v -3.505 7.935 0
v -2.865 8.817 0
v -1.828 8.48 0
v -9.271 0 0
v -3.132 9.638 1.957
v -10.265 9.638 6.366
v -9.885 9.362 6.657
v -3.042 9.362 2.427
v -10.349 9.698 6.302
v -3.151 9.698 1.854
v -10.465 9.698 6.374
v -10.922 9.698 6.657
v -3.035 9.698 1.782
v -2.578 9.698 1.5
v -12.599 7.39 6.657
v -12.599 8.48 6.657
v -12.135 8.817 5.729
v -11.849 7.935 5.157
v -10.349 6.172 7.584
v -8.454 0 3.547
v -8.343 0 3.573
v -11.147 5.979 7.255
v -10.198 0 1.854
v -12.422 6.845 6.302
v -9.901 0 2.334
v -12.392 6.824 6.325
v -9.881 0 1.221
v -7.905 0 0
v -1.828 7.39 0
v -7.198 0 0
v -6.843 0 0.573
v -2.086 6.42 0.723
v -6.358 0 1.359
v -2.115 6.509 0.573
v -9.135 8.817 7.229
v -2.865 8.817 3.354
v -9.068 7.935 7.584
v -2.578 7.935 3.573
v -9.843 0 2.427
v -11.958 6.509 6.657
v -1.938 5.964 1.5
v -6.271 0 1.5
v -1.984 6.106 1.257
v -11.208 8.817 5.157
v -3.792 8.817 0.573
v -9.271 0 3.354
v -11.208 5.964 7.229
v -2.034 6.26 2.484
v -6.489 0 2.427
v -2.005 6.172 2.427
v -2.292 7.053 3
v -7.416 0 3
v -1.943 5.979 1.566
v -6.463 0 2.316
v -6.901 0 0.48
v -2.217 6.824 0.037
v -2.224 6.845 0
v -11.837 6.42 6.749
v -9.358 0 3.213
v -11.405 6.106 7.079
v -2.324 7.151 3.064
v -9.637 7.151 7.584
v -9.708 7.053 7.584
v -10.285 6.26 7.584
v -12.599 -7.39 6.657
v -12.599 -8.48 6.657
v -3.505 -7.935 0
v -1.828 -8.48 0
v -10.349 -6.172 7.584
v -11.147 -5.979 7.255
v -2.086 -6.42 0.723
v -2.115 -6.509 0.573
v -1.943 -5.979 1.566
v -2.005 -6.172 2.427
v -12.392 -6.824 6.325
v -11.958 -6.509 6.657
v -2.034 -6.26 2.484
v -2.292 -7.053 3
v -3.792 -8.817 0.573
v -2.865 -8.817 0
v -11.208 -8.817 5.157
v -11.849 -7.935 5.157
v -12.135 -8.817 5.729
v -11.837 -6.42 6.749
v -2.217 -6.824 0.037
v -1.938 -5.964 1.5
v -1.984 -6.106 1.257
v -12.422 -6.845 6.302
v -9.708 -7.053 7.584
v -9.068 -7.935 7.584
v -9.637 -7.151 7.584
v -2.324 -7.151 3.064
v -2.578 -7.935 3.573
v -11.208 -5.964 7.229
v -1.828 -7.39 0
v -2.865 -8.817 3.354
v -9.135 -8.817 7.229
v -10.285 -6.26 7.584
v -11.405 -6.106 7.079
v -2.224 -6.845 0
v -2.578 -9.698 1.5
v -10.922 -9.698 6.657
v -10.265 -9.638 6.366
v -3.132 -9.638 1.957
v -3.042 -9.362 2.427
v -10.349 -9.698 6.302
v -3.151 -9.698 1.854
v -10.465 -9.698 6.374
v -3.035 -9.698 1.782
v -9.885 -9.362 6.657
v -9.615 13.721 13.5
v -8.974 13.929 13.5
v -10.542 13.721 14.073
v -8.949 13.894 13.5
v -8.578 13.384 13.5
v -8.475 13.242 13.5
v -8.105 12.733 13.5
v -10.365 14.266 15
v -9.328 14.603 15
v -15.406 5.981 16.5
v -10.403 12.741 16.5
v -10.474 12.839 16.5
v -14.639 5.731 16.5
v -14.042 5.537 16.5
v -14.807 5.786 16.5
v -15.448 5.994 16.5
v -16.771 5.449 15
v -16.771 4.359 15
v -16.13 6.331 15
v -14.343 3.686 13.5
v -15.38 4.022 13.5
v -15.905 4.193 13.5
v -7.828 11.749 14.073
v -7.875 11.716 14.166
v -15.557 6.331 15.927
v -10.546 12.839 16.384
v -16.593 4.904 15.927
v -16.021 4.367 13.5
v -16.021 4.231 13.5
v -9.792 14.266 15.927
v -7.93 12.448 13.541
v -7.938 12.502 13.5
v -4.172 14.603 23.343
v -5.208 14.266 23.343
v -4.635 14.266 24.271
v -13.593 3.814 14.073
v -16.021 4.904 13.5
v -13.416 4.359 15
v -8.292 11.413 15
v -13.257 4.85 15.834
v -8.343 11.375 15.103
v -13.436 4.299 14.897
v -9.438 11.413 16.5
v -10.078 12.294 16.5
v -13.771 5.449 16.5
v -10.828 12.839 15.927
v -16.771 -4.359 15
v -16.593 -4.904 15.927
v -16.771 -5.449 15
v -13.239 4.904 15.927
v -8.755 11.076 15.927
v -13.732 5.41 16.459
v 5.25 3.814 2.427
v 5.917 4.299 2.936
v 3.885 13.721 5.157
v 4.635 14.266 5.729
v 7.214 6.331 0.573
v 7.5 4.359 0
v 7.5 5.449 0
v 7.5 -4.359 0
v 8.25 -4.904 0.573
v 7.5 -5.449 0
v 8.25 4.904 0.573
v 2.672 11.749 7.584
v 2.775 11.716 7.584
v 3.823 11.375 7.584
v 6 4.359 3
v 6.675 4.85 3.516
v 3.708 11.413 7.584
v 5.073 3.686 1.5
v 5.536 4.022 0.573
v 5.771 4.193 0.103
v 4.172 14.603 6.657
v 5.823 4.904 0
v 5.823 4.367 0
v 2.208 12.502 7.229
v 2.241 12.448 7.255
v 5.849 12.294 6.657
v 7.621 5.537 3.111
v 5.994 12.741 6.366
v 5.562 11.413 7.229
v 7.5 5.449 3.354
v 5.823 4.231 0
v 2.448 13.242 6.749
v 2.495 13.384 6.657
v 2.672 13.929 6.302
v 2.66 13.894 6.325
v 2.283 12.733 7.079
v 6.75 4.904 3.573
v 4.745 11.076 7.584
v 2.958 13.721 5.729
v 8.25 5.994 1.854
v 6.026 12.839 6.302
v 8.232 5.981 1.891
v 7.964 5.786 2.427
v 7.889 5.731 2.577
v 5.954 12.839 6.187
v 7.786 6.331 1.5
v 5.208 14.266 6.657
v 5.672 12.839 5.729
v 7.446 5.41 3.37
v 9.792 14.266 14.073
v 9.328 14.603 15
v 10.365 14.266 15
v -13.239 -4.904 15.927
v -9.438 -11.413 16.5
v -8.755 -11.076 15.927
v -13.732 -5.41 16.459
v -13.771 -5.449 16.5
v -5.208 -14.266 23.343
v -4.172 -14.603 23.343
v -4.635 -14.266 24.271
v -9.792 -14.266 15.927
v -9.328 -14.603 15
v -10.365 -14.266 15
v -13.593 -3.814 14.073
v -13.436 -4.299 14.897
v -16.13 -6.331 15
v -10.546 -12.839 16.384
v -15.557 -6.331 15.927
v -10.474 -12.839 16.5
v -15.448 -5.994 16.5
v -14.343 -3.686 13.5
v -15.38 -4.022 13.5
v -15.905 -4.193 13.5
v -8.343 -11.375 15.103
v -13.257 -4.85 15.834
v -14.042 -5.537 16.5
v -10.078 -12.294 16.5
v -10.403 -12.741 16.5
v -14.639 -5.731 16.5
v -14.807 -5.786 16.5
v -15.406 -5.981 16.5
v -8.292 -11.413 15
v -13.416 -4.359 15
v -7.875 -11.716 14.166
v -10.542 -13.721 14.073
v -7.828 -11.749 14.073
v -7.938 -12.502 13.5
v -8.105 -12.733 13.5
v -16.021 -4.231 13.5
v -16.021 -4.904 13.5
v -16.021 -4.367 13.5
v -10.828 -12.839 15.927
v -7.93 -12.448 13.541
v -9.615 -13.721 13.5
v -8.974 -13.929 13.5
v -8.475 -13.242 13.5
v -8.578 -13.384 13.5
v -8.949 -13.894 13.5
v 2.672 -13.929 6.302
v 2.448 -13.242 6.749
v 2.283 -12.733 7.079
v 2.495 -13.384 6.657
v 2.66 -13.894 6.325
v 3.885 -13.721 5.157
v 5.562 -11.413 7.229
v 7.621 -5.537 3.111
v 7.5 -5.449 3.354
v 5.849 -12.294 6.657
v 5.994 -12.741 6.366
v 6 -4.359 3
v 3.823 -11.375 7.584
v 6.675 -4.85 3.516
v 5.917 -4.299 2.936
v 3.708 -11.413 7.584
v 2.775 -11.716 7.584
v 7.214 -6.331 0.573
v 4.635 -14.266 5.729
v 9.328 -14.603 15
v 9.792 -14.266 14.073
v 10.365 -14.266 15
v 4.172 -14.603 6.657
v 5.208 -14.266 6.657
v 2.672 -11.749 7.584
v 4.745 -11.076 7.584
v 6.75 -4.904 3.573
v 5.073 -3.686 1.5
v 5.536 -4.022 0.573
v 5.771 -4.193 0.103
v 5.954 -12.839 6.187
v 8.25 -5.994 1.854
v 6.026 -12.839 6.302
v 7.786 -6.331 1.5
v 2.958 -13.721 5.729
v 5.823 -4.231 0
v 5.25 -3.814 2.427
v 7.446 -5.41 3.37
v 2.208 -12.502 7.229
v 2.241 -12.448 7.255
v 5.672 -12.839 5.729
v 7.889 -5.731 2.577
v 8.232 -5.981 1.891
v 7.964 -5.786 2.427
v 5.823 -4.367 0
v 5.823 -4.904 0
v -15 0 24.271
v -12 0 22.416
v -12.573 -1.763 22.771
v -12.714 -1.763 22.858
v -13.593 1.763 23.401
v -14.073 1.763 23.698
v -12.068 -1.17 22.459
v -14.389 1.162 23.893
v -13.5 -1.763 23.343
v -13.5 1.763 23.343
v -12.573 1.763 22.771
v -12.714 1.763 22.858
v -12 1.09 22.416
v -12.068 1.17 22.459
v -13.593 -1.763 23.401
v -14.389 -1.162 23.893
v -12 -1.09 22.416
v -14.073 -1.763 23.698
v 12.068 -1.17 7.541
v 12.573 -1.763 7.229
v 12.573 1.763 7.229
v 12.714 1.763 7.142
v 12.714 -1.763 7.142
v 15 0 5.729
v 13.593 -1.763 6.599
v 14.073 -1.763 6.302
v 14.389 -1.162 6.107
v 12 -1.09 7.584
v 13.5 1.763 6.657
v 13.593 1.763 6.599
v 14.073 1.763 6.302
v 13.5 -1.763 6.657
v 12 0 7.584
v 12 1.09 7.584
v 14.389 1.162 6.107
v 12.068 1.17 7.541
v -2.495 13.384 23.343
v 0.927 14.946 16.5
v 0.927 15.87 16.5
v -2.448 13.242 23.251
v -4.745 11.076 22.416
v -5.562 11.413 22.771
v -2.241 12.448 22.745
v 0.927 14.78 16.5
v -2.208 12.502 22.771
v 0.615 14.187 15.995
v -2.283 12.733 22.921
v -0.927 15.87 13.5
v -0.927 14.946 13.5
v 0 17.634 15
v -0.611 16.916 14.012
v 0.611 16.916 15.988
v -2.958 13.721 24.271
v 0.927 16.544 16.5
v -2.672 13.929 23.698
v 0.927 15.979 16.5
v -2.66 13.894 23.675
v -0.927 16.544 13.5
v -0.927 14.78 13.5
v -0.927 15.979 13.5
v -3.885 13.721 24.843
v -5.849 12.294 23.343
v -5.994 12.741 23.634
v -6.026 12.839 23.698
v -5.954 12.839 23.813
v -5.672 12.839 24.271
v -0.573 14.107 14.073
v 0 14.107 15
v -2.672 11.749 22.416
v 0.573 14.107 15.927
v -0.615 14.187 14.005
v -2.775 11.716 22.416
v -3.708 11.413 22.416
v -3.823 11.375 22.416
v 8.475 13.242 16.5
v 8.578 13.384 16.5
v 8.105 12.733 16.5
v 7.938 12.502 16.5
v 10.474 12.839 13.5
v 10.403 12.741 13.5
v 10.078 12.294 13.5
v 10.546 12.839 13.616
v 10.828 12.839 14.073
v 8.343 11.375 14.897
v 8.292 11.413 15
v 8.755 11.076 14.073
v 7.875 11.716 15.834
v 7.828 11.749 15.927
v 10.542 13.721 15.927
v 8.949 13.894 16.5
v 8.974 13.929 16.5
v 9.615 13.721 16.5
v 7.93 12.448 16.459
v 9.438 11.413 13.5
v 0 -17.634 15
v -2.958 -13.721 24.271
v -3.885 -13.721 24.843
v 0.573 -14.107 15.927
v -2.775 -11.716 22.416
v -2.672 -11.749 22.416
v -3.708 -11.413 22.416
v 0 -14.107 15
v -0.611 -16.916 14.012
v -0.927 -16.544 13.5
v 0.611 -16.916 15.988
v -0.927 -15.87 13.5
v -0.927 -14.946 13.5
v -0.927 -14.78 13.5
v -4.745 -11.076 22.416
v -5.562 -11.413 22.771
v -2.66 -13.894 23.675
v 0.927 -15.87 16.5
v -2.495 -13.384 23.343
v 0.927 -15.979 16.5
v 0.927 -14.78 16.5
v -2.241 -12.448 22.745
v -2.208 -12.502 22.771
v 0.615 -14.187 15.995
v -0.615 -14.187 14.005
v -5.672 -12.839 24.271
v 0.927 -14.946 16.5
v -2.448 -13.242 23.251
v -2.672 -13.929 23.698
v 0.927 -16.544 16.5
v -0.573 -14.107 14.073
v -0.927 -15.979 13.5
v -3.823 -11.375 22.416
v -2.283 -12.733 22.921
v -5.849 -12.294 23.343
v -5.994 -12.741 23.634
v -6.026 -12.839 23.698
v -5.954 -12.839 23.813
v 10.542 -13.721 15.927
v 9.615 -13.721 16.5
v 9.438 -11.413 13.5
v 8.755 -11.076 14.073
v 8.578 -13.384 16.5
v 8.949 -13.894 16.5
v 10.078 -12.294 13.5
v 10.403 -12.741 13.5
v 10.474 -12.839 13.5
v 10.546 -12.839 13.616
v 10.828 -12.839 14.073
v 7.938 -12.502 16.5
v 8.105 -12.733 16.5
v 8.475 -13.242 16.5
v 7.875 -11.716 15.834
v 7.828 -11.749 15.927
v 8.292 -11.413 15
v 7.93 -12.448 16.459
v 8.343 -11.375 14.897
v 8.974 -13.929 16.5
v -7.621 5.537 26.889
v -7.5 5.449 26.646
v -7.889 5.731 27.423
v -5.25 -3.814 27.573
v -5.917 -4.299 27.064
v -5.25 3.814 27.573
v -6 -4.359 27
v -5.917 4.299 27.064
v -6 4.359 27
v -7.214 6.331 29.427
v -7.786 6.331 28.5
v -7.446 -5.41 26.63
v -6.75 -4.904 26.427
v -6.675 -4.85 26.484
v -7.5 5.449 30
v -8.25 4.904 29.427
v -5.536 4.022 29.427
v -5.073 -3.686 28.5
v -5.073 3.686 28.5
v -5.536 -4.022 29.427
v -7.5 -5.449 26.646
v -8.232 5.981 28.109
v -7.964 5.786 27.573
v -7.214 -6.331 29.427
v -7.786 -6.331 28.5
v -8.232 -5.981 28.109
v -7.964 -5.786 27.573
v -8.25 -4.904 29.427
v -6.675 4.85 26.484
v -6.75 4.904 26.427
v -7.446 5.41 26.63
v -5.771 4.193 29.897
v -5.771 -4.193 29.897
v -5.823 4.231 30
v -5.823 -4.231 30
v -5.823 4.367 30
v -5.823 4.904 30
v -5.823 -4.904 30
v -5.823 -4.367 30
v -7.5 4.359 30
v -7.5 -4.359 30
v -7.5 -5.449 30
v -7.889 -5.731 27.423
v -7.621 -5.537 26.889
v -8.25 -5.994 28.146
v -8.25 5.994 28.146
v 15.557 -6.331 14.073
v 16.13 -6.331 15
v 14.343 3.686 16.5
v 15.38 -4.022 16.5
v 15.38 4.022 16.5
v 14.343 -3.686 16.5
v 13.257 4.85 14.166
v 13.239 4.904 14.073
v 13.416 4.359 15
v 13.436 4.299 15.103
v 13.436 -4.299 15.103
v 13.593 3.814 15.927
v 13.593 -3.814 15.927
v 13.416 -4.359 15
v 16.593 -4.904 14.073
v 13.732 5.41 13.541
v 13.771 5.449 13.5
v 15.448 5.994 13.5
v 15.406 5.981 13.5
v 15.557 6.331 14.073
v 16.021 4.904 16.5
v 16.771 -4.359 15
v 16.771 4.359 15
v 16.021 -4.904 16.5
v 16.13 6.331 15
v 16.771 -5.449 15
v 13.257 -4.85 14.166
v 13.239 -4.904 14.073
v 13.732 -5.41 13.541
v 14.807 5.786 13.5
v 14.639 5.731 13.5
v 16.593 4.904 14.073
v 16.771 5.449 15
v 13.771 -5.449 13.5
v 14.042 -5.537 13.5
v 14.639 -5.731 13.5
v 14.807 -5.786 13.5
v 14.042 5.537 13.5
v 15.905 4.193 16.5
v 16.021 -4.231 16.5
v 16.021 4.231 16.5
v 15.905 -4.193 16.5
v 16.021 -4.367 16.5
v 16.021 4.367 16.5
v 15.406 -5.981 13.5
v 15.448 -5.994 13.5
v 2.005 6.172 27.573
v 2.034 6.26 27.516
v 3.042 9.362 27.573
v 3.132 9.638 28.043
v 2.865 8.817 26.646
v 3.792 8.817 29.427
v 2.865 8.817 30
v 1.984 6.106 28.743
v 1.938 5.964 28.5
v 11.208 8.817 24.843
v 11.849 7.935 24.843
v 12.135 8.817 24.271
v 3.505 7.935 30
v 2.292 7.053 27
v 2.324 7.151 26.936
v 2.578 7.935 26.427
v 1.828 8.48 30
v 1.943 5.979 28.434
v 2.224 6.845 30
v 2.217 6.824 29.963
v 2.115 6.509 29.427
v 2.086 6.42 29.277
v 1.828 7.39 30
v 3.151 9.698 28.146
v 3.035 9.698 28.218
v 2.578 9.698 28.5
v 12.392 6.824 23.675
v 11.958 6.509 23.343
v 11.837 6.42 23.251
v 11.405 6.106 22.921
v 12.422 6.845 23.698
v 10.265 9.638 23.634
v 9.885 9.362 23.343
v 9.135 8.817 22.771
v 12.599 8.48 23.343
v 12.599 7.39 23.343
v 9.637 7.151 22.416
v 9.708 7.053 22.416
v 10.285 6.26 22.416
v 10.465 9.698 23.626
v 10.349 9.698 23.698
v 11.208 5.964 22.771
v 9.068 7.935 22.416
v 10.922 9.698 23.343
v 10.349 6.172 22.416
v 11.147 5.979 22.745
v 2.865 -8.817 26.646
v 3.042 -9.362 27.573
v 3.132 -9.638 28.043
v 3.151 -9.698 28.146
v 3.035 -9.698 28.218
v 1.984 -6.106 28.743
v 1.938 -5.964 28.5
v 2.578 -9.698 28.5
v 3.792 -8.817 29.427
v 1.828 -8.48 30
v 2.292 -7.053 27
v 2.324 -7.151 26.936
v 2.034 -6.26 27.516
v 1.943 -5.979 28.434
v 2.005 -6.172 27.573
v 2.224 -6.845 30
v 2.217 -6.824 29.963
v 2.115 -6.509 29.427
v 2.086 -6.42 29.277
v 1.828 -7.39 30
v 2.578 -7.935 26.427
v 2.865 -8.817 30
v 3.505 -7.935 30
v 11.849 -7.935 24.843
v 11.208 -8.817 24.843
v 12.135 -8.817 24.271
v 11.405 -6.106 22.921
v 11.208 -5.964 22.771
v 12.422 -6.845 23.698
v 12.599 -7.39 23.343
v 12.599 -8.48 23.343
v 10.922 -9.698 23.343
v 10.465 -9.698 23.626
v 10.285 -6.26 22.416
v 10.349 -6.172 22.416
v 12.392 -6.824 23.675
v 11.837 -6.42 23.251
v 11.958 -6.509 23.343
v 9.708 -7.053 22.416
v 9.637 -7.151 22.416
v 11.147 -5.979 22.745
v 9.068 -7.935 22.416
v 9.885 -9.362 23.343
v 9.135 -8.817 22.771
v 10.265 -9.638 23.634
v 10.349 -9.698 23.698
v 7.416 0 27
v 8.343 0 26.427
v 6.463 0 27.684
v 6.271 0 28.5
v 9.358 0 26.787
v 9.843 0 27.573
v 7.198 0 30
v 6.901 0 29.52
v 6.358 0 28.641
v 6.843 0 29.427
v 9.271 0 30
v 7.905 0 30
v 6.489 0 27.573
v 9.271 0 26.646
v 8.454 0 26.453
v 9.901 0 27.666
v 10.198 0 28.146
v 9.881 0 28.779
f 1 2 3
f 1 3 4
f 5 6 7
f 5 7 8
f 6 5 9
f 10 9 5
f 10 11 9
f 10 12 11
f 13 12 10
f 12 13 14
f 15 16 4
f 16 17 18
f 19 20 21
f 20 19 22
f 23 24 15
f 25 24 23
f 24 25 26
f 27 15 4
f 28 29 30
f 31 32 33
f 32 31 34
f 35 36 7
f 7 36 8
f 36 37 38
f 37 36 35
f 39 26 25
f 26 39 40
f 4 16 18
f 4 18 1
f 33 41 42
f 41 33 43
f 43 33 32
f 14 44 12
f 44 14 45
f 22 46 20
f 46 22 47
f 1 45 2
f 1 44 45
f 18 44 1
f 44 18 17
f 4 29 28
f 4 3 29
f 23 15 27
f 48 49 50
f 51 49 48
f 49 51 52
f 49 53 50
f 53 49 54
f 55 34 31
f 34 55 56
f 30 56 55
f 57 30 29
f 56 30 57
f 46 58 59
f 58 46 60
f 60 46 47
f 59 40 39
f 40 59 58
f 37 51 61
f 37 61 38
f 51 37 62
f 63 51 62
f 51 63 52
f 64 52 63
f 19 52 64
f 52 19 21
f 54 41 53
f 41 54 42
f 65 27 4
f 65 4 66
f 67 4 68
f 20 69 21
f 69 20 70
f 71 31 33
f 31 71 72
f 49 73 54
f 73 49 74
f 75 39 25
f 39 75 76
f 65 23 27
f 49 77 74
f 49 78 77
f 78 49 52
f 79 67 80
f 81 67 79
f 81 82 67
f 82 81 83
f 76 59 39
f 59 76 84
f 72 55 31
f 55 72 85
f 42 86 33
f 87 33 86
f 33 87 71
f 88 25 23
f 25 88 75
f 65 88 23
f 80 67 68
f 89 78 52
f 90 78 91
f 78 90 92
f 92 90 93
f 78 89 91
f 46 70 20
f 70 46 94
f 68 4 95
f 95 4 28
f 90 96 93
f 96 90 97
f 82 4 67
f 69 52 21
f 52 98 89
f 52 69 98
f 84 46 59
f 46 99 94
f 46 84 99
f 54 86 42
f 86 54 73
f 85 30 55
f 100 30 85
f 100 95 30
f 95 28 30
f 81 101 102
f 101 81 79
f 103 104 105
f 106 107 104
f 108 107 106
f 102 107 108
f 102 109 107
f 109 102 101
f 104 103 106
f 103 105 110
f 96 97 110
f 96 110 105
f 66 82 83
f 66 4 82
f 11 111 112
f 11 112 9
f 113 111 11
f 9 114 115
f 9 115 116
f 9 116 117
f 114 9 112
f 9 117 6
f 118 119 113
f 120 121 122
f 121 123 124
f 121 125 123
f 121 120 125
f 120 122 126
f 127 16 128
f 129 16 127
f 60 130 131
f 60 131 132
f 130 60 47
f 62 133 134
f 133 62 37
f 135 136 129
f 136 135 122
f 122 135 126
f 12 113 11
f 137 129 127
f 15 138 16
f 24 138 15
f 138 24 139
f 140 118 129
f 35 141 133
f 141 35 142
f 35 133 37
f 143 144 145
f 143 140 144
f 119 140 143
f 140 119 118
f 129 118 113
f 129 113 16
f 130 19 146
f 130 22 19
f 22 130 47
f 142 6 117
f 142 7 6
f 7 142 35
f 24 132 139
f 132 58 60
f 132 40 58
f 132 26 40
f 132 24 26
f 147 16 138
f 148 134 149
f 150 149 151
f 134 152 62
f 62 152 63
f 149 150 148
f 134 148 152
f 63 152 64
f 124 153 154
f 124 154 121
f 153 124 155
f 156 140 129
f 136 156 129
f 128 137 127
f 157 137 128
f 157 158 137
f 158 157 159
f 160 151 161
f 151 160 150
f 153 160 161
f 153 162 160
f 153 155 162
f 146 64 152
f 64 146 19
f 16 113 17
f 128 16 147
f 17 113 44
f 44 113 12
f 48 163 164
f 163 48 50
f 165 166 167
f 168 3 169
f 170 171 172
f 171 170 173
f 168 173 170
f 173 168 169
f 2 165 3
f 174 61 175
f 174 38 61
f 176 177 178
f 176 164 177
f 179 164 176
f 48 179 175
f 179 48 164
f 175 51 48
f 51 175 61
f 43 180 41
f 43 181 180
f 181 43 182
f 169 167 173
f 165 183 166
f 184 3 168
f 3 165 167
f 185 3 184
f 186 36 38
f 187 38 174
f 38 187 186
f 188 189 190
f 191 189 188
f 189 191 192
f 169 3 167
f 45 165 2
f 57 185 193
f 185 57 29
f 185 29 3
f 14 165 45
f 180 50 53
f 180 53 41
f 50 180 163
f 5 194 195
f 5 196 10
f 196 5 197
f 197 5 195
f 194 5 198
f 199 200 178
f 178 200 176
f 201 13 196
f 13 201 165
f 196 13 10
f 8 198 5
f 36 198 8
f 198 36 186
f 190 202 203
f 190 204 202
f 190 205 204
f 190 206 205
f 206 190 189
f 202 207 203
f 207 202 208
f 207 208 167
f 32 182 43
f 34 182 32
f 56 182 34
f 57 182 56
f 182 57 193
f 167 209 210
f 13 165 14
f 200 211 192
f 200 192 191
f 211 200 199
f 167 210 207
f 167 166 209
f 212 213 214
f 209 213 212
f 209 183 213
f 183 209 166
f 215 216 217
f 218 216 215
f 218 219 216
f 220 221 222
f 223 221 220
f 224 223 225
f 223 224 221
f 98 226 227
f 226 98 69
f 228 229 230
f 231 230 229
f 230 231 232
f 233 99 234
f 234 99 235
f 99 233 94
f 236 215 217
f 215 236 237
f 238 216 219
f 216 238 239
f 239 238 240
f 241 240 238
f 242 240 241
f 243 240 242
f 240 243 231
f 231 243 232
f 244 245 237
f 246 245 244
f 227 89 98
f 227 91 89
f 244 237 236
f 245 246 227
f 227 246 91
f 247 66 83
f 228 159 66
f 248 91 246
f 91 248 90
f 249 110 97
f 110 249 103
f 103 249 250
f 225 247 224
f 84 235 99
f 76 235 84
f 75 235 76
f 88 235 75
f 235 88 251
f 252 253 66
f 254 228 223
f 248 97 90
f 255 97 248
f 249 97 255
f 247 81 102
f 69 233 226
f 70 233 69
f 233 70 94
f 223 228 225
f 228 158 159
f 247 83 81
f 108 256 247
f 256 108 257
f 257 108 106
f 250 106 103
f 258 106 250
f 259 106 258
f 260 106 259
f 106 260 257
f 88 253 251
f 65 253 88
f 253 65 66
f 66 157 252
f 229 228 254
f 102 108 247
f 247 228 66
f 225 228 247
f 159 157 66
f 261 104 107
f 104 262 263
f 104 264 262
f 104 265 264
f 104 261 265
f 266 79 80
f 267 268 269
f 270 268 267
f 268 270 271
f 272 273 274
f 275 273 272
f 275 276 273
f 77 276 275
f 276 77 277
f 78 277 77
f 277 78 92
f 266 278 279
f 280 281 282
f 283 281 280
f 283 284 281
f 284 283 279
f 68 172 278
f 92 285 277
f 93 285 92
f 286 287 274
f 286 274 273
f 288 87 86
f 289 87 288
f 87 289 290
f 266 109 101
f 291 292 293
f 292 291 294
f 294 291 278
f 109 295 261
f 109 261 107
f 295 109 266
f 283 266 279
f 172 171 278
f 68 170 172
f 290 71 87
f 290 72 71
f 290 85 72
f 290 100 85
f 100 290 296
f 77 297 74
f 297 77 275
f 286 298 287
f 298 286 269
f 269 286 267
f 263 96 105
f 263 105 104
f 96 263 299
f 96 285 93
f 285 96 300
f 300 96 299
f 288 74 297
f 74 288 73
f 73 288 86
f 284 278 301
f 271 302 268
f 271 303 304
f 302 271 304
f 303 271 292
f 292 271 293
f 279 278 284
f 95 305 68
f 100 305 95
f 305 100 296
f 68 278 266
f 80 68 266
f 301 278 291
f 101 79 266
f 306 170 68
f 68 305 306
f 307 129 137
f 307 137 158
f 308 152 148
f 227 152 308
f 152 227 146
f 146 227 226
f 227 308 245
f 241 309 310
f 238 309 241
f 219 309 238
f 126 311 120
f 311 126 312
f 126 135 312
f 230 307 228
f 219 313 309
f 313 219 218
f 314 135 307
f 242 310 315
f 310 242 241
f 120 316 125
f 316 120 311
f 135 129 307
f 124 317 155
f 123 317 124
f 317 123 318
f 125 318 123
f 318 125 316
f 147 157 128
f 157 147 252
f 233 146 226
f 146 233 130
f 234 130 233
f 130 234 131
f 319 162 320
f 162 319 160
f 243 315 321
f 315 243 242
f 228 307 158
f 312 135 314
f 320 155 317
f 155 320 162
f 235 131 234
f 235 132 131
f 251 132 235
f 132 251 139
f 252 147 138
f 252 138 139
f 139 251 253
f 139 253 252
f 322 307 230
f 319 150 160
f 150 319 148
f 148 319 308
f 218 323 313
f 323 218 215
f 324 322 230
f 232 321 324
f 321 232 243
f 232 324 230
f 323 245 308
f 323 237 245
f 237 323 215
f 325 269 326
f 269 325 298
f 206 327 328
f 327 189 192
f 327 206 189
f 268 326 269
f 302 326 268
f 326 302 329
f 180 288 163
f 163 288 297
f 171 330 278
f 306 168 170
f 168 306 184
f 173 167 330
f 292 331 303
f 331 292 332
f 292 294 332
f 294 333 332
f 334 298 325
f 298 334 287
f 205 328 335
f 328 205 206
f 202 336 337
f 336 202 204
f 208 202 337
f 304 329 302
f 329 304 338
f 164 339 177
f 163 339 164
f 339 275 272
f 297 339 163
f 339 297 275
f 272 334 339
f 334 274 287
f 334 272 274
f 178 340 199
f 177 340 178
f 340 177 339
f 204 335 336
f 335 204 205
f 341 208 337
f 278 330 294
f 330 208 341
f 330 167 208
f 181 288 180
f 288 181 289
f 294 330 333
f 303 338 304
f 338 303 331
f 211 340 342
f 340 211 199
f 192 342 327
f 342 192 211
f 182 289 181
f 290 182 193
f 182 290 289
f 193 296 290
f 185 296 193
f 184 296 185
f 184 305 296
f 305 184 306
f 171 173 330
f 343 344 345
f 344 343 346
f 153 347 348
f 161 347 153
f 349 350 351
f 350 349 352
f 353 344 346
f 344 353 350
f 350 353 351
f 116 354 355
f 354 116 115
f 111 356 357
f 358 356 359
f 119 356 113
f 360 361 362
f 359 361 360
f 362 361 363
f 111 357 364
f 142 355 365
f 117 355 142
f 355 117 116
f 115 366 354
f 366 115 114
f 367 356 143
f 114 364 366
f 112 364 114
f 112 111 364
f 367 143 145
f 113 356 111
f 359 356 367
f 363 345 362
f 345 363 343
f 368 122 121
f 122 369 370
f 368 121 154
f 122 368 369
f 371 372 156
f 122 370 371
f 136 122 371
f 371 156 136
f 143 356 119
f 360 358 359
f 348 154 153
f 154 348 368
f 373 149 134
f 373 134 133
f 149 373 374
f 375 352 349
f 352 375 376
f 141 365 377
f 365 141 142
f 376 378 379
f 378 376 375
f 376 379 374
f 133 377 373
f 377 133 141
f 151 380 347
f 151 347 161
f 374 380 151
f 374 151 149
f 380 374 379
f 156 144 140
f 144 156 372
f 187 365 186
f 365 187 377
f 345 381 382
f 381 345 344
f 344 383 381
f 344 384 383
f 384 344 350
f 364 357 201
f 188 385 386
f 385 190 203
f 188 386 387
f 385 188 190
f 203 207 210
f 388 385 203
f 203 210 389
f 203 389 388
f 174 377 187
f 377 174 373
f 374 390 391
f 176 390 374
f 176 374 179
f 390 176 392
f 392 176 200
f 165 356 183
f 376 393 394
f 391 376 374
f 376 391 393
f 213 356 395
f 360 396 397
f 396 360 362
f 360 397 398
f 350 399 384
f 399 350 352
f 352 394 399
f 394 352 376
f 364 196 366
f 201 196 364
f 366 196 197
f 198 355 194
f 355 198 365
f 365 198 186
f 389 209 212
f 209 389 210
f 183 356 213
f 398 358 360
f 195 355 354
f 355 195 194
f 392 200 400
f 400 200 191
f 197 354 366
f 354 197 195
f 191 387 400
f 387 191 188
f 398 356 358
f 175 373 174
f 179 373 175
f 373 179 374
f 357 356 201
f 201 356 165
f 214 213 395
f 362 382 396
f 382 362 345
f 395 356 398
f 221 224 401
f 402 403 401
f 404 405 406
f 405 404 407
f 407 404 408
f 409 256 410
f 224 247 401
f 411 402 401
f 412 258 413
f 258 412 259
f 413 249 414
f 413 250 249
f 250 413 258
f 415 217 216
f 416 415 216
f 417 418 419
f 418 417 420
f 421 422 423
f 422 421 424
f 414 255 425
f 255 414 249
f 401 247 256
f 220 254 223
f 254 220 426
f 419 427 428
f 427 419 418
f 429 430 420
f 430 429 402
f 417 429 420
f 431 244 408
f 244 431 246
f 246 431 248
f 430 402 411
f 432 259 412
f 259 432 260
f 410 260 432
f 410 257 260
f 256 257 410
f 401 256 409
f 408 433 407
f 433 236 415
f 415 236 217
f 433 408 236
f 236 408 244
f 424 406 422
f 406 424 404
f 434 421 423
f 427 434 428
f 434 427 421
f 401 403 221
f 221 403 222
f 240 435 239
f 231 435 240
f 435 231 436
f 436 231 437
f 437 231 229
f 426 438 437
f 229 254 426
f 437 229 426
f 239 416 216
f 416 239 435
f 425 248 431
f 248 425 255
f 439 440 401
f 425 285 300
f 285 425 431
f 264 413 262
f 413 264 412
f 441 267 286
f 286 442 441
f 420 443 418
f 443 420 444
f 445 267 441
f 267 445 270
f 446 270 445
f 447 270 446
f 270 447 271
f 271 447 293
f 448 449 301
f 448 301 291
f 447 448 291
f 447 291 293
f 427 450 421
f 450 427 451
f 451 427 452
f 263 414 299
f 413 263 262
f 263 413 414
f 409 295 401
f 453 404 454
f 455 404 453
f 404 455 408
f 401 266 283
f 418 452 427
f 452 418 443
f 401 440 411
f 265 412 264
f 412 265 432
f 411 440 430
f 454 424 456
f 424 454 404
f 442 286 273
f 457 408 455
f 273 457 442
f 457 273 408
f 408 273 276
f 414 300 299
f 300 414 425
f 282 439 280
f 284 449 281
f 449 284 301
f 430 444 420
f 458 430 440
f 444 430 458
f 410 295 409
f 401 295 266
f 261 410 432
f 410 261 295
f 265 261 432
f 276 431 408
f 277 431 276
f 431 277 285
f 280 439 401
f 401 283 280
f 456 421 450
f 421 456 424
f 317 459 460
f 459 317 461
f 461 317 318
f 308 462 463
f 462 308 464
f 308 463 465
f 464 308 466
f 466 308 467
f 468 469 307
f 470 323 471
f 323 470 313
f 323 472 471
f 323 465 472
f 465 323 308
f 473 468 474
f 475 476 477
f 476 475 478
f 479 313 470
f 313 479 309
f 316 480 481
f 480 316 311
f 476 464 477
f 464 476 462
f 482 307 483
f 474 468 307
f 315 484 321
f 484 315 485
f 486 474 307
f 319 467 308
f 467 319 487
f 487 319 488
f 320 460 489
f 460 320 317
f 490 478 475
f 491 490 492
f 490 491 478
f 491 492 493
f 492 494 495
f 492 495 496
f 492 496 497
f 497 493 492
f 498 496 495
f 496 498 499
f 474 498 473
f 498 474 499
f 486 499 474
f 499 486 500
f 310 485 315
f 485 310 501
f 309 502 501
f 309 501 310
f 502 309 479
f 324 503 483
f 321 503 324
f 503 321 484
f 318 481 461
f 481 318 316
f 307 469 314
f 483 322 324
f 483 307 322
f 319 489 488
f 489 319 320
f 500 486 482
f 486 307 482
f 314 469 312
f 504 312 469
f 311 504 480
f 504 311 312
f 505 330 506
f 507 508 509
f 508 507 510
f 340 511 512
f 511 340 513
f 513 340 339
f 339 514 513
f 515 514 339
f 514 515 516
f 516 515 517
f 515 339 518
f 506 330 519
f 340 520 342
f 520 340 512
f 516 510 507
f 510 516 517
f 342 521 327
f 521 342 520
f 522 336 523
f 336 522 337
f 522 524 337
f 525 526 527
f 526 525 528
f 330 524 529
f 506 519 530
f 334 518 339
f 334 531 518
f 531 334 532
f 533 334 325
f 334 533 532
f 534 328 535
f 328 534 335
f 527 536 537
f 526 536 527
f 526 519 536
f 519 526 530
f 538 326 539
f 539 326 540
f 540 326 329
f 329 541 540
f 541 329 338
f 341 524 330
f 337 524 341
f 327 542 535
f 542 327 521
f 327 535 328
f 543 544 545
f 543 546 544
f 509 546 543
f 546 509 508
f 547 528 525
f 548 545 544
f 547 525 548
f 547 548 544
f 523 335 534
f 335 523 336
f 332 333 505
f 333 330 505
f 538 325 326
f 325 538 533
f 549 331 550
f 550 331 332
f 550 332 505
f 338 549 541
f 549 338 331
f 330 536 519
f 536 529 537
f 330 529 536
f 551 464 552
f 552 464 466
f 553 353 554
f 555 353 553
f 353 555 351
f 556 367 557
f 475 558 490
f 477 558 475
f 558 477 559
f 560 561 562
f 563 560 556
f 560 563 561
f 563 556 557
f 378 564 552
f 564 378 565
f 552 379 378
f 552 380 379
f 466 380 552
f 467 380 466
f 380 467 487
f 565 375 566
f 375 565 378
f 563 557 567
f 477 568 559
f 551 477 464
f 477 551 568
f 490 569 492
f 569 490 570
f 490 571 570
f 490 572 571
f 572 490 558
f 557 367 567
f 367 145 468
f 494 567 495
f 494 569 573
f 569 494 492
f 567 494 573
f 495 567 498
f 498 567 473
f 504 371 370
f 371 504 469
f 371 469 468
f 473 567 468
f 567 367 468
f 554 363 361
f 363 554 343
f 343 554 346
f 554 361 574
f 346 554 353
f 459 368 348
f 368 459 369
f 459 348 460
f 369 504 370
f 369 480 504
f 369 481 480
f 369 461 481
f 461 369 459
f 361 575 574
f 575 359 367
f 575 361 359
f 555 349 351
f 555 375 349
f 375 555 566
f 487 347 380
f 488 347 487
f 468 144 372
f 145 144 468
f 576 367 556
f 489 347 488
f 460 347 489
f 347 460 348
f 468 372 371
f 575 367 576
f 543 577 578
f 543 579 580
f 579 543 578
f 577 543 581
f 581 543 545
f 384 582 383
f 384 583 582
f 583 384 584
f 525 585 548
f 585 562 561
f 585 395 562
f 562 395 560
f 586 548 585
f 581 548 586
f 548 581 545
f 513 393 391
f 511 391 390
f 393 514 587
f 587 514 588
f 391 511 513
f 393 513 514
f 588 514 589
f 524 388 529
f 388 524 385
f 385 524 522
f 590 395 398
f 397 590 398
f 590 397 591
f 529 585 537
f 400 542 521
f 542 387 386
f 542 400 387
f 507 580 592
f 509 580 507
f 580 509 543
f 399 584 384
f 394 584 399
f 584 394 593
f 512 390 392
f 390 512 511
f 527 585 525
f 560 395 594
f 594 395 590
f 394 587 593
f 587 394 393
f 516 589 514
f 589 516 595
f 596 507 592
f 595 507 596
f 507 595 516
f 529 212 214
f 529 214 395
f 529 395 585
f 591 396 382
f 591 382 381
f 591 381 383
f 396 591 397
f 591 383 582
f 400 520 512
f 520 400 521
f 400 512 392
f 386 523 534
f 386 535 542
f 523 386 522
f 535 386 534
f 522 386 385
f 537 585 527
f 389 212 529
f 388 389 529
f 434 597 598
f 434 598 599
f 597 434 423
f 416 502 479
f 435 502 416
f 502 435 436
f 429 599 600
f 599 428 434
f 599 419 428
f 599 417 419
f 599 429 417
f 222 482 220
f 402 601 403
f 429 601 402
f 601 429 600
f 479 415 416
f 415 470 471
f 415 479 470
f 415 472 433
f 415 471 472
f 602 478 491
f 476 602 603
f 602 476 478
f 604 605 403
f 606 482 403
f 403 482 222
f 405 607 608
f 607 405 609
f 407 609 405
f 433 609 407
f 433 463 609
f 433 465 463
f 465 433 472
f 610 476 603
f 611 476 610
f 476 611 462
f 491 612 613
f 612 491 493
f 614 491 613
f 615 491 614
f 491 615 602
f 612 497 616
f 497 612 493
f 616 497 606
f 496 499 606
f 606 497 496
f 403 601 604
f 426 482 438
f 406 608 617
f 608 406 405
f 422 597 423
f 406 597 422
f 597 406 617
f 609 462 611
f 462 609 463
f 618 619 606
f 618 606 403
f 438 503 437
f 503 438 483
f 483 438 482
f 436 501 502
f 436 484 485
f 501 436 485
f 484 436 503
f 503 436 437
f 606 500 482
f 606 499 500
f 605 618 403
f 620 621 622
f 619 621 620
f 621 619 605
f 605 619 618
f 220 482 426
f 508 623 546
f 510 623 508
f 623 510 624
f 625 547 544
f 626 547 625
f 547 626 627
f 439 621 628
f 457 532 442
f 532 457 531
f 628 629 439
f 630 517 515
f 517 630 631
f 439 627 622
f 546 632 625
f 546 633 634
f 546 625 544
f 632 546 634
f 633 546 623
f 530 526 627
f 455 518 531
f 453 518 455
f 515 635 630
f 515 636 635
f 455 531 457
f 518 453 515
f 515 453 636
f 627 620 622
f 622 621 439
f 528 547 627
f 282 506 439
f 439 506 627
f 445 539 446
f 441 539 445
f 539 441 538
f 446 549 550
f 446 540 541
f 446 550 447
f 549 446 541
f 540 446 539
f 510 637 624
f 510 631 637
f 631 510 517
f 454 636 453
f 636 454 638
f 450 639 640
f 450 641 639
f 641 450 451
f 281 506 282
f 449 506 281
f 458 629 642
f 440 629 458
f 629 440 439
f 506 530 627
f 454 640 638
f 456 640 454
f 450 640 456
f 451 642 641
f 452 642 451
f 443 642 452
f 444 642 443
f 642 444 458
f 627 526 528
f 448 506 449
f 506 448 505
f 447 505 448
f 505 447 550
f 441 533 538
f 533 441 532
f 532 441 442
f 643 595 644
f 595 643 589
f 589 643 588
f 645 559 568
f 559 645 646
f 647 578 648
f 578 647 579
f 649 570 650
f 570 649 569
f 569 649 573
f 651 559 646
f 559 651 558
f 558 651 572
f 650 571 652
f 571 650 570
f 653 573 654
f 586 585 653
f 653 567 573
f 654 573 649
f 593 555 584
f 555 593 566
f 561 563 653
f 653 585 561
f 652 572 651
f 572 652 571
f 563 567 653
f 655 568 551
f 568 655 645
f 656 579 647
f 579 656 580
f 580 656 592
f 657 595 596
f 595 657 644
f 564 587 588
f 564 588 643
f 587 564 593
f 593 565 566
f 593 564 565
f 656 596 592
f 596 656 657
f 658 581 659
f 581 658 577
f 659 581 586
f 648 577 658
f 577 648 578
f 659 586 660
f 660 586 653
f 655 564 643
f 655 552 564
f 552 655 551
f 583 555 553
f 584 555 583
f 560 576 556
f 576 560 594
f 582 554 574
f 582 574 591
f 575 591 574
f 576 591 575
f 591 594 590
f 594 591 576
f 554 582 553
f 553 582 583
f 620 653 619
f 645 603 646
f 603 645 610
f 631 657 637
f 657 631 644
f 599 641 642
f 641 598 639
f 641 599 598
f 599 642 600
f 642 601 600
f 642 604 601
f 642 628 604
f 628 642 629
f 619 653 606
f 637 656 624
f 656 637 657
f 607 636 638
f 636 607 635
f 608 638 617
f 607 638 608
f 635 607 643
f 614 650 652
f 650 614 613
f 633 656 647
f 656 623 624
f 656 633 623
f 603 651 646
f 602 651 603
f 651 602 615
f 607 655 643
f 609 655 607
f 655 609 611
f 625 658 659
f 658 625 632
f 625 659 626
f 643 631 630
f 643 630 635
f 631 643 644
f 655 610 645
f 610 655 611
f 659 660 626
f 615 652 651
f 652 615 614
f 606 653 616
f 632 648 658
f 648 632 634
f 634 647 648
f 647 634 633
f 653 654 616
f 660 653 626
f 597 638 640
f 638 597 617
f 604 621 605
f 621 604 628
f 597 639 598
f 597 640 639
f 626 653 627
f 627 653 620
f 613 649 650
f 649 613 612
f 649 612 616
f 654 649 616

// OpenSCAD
// shape height
sh = 30;
// border width
bw = 3;

include <../polyhedra.scad>;

poly_wire(icosidodecahedron, fill_face_sizes=[3]);
